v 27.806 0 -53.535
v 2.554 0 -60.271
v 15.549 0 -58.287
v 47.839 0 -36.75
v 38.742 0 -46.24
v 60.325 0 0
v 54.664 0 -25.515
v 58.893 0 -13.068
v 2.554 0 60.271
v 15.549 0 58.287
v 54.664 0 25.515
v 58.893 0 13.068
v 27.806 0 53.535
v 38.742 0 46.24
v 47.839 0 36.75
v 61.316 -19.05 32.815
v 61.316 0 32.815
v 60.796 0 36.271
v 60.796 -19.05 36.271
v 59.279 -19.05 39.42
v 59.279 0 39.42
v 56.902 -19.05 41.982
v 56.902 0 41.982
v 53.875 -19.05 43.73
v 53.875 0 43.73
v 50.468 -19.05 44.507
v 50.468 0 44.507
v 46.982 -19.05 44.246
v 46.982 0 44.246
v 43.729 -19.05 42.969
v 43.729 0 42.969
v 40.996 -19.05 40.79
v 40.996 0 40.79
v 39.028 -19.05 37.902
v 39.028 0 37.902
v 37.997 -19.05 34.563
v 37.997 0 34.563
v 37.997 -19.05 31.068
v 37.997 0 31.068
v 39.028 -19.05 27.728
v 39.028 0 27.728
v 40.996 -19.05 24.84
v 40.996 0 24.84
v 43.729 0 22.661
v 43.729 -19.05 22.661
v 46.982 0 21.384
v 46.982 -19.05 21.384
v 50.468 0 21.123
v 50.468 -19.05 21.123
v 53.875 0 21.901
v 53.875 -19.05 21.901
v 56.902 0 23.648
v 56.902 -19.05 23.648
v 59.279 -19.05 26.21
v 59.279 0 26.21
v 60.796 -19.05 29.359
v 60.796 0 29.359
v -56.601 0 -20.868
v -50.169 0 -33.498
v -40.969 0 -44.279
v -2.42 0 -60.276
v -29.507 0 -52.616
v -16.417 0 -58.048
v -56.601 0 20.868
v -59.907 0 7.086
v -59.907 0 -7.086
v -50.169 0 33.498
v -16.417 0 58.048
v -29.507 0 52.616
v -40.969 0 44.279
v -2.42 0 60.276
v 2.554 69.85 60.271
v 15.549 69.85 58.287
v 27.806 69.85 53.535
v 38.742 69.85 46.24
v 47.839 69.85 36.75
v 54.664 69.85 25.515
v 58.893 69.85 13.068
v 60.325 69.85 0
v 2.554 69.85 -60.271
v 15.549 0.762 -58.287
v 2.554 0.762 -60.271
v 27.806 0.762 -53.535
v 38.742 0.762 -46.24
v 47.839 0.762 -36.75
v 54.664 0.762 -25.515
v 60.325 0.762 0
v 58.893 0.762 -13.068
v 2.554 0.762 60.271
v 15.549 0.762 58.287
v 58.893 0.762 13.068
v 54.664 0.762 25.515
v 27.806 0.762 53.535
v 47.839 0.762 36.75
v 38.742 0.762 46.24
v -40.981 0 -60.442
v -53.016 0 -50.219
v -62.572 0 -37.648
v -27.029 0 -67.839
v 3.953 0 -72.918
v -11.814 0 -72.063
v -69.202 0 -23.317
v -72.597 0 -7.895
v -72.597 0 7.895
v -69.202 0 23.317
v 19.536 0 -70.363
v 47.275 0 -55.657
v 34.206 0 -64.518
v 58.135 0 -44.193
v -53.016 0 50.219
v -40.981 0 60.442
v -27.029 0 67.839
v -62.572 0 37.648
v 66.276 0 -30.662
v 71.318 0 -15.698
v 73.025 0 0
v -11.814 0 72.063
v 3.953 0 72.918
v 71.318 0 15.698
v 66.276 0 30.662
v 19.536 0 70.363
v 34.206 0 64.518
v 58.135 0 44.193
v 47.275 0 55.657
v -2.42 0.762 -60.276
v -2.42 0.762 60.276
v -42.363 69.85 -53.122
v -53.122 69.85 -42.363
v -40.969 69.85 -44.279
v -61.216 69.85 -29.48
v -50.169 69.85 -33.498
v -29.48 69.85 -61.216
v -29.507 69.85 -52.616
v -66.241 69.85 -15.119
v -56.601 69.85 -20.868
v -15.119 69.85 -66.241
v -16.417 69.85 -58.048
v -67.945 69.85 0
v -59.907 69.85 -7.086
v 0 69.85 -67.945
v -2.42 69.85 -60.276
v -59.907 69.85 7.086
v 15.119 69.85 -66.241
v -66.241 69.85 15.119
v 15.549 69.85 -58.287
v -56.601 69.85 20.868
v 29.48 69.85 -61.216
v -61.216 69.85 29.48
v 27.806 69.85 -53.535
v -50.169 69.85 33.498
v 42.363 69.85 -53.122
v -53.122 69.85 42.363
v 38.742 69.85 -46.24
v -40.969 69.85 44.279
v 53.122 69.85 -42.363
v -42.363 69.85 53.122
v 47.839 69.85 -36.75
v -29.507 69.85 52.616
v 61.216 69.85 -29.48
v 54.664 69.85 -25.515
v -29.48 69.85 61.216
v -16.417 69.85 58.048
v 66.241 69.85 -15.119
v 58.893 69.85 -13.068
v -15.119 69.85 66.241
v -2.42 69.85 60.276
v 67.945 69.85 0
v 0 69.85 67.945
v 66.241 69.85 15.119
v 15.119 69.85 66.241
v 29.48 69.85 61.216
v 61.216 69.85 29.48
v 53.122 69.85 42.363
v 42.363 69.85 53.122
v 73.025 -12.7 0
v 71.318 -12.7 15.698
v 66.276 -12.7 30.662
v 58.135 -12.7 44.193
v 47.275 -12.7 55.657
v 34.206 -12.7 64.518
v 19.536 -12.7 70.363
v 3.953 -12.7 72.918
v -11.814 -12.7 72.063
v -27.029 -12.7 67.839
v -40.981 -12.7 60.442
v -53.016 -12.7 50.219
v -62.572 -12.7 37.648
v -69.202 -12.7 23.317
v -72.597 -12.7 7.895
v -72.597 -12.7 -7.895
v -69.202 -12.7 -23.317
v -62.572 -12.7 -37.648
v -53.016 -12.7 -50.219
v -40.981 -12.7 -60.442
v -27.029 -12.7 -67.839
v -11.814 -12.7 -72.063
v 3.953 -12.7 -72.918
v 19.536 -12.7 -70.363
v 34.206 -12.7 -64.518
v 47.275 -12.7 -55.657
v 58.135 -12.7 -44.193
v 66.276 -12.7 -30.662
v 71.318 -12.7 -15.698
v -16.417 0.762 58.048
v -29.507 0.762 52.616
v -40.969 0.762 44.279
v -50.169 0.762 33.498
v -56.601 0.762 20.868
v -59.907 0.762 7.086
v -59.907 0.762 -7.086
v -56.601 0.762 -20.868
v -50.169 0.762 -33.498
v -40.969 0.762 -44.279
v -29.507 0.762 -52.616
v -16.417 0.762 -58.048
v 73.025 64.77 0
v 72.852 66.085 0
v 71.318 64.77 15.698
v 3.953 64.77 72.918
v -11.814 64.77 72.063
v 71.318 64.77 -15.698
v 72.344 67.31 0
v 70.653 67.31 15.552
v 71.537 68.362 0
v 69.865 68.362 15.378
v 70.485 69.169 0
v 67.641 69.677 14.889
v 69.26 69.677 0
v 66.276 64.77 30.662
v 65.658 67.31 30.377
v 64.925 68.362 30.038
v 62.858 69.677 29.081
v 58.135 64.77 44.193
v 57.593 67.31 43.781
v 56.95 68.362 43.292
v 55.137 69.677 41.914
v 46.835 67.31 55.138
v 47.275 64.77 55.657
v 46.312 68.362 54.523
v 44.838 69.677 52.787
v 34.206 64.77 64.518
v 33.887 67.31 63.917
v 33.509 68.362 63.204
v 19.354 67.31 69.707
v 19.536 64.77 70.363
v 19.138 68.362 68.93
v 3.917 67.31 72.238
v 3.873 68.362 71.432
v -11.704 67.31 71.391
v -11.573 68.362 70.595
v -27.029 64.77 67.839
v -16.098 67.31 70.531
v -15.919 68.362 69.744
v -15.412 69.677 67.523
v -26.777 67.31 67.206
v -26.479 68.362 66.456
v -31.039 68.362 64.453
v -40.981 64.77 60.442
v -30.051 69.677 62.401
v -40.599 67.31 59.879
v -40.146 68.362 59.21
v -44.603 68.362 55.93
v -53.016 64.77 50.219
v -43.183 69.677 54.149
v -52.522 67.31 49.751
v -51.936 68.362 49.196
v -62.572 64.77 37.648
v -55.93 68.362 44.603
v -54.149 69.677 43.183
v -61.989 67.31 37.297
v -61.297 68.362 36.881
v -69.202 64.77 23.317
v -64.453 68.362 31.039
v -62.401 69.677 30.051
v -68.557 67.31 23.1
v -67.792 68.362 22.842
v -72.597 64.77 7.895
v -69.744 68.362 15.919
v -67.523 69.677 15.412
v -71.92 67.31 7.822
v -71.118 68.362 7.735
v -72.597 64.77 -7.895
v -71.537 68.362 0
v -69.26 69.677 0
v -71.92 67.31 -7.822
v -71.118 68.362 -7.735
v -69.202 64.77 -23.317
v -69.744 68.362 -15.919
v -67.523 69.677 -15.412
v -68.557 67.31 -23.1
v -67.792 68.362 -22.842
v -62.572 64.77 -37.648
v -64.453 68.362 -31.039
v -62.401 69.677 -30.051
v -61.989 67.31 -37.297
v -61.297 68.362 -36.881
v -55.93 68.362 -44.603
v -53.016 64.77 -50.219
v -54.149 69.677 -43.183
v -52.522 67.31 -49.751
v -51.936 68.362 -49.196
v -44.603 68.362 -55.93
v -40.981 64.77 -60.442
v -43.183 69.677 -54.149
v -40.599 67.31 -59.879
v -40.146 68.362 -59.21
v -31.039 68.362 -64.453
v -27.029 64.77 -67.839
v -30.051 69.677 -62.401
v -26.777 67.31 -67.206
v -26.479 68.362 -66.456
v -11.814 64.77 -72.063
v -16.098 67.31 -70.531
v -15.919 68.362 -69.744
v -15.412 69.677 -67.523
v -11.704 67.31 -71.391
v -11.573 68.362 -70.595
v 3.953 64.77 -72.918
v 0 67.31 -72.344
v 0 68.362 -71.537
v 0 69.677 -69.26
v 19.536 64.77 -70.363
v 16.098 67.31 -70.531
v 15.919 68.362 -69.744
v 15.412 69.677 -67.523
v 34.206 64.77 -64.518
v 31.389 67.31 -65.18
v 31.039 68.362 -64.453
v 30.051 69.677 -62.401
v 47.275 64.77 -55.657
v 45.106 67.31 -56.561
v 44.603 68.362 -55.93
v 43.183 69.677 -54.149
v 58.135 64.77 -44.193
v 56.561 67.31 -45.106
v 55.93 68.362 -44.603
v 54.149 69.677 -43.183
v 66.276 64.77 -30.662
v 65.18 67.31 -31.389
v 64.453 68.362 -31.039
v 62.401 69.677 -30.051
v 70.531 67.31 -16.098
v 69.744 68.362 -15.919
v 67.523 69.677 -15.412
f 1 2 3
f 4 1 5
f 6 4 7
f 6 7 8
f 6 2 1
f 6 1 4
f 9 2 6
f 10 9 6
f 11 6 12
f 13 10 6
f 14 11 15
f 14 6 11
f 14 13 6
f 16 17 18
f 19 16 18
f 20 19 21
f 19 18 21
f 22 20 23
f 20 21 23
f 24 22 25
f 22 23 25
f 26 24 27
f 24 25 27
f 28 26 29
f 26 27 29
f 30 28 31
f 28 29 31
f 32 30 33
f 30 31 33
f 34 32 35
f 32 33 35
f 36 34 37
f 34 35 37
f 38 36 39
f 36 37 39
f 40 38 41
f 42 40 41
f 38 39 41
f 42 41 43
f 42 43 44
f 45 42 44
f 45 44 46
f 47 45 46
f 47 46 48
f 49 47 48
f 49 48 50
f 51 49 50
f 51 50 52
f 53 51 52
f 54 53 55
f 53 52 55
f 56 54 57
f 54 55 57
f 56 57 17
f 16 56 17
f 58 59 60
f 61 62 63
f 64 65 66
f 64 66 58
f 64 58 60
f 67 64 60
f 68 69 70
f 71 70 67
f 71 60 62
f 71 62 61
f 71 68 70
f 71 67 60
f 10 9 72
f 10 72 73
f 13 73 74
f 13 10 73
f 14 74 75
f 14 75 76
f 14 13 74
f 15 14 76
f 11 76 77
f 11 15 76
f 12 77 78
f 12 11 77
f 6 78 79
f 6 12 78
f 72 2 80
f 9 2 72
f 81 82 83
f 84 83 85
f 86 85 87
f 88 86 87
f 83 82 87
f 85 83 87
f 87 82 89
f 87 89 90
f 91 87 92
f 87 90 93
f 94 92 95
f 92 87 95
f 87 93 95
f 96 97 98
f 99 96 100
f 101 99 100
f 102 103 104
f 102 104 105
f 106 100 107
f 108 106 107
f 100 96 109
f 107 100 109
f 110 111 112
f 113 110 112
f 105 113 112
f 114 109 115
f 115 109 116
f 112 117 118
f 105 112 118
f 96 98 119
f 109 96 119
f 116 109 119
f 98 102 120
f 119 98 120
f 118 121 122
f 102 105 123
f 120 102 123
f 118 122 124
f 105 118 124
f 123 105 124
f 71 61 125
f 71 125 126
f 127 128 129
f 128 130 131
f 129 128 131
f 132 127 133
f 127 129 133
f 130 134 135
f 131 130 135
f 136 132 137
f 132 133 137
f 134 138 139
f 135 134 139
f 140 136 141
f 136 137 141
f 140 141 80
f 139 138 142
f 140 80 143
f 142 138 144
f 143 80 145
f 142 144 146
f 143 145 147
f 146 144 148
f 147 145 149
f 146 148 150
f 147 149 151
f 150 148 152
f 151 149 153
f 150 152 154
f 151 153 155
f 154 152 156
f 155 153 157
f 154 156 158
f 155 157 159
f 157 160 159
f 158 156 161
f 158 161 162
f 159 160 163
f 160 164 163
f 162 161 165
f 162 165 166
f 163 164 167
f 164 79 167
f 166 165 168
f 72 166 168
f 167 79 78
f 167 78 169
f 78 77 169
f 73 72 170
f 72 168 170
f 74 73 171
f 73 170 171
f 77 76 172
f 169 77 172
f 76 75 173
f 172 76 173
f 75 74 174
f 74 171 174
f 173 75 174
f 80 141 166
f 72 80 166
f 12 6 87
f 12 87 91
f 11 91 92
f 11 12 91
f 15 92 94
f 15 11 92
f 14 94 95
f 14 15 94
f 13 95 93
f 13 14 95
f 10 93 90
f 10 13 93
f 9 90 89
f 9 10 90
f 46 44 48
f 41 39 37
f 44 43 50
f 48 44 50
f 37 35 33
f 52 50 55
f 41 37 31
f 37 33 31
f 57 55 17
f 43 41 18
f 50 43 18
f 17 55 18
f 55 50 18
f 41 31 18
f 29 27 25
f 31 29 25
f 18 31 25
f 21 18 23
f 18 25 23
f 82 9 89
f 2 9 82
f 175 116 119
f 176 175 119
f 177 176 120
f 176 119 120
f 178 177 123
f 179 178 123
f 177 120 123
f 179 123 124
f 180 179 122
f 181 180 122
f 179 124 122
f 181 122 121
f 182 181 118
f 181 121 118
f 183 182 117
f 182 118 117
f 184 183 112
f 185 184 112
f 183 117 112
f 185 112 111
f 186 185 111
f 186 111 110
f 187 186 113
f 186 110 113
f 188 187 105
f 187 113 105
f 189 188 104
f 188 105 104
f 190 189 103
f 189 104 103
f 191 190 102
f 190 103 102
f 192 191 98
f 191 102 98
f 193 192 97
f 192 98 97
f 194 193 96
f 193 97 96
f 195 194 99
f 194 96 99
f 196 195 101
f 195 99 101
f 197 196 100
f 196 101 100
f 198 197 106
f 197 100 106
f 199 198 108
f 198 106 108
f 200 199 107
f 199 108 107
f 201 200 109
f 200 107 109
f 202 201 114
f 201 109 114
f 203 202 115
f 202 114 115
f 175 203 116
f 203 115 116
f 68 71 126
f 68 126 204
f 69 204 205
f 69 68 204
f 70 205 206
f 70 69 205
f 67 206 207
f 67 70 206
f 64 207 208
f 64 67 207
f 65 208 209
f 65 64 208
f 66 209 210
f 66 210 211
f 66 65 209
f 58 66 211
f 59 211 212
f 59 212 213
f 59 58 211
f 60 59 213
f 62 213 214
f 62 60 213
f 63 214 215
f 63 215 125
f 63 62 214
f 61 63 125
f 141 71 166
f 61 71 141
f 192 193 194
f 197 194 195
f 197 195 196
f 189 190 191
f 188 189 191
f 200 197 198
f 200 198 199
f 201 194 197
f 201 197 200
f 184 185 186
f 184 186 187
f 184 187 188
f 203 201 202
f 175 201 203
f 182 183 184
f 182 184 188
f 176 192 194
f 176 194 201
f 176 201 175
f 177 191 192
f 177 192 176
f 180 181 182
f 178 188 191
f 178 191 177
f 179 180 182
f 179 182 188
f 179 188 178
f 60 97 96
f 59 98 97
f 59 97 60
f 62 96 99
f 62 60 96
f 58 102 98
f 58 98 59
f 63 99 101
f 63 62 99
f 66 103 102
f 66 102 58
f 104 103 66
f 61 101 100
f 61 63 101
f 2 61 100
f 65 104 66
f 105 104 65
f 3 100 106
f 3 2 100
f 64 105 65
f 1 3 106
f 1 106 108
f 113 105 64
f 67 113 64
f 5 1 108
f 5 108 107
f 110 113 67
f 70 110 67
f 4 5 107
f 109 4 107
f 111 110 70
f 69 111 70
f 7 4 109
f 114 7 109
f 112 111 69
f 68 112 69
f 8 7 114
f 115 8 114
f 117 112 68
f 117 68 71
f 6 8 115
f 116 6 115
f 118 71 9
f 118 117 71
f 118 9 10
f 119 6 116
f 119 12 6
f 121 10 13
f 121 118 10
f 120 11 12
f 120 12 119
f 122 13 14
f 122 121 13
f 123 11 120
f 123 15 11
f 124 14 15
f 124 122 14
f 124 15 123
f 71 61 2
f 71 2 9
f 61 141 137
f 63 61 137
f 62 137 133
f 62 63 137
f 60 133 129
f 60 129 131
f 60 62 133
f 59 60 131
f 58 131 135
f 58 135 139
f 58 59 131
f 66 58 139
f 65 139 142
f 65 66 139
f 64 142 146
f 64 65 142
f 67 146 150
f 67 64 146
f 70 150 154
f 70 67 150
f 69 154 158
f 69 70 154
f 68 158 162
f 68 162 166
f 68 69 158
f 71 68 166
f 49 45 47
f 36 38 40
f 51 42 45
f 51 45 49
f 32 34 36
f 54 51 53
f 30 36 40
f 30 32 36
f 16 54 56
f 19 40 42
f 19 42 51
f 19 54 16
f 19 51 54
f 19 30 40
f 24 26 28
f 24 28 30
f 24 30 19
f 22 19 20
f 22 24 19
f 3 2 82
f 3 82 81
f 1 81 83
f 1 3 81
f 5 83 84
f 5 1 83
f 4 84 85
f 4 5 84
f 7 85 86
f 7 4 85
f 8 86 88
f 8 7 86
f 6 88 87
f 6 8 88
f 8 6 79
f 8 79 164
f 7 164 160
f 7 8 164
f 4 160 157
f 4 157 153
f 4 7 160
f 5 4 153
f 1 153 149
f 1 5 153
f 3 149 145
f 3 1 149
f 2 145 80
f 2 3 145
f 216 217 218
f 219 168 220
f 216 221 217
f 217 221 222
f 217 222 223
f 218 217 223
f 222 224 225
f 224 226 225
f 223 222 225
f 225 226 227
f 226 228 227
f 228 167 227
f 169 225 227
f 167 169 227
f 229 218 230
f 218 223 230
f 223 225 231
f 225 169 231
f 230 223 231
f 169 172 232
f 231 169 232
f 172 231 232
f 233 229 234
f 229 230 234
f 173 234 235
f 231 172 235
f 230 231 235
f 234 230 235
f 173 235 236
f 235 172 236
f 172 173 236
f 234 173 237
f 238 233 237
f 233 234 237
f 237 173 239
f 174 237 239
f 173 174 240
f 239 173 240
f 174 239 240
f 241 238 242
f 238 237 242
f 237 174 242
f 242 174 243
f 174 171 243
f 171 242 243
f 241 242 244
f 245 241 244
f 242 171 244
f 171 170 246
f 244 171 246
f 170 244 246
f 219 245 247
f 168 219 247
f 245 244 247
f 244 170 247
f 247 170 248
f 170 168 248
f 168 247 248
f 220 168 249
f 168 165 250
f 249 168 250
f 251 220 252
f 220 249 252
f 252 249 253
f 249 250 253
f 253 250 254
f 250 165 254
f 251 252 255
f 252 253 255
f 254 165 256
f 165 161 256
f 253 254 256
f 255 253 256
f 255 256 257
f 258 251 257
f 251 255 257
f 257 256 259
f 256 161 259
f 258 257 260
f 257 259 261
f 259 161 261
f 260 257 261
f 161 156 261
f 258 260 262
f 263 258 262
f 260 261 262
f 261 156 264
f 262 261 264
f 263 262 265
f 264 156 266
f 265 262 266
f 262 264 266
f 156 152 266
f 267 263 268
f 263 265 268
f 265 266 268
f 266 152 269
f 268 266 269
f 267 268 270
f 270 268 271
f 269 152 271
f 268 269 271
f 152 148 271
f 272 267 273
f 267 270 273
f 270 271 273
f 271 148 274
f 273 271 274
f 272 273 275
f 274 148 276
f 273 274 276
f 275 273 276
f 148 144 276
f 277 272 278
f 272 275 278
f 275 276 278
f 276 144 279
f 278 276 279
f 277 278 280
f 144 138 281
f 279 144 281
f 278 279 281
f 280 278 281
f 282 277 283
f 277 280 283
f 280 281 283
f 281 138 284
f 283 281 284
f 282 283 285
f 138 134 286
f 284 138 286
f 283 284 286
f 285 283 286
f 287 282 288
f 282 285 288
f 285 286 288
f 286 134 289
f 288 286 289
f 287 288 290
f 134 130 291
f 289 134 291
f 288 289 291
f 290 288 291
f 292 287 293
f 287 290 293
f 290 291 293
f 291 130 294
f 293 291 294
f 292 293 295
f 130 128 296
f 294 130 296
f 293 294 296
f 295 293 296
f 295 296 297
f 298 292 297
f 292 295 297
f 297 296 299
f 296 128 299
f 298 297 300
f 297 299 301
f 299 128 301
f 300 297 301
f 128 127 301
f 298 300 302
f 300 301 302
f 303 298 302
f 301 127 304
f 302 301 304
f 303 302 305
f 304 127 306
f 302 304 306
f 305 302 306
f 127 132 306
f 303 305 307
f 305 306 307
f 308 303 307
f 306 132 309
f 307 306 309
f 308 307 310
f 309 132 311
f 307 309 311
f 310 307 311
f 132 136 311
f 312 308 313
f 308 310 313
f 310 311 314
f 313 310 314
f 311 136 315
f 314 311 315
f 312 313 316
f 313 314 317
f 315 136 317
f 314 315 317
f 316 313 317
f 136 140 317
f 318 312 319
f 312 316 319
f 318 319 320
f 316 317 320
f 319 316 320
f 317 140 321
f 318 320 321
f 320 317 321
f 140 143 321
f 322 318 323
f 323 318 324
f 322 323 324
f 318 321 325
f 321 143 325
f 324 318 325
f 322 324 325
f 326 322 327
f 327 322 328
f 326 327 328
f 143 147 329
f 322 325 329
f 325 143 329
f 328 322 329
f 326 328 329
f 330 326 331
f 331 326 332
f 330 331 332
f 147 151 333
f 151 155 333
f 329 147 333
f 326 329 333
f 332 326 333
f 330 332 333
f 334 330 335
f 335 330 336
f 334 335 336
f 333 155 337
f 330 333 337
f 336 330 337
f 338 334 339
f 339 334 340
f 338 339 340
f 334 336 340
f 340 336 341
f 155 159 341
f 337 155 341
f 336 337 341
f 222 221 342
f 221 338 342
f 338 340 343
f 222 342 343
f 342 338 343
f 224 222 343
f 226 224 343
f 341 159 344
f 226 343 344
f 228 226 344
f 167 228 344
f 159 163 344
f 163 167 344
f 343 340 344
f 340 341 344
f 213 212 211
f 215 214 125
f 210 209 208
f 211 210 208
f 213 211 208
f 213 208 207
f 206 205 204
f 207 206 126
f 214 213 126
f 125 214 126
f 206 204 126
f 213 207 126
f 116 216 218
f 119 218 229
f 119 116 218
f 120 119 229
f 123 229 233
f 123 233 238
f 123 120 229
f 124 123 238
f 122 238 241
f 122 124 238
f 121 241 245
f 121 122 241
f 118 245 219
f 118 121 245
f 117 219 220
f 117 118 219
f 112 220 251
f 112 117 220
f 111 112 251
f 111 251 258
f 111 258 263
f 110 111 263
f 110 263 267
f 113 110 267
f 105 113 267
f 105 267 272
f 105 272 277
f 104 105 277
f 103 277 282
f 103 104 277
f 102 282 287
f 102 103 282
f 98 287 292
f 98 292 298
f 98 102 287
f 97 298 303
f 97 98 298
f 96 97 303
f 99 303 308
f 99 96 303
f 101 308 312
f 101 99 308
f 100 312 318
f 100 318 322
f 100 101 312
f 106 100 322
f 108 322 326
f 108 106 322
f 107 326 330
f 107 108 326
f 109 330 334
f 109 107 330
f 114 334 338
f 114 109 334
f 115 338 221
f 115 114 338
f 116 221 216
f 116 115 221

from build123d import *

# Parameters (mm, degrees)
F0_R     = 73.025
F1_DEPTH = 69.85
F2_DEPTH = 0.762
F3_R     = 5.08
F4_DEPTH = 12.7
F5_R     = 11.725025
F6_DEPTH = 19.05


with BuildPart() as f1:
    # F0 (on Front) → F1 (new body)
    with BuildSketch(Plane.XZ):
        Circle(F0_R)
        with BuildLine():
            ThreePointArc((2.553723, 60.270923), (43.549736, 41.743576), (60.325, 0))
            ThreePointArc((60.325, 0), (43.549736, -41.743576), (2.553723, -60.270923))
            ThreePointArc((2.553723, -60.270923), (0.066801, -60.324963), (-2.420234, -60.276431))
            ThreePointArc((-2.420234, -60.276431), (-60.325, 0), (-2.420234, 60.276431))
            ThreePointArc((-2.420234, 60.276431), (0.066801, 60.324963), (2.553723, 60.270923))
        make_face(mode=Mode.SUBTRACT)
        with BuildLine():
            Line((2.553723, -60.270923), (2.553723, 60.270923))
            ThreePointArc((2.553723, 60.270923), (0.066801, 60.324963), (-2.420234, 60.276431))
            Line((-2.420234, 60.276431), (-2.420234, -60.276431))
            ThreePointArc((-2.420234, -60.276431), (0.066801, -60.324963), (2.553723, -60.270923))
        make_face()
    extrude(amount=-F1_DEPTH)

    # F3
    f3_edges = [f1.edges().sort_by_distance(p)[0] for p in [
        (-73.025, 69.85, 0),
    ]]
    fillet(f3_edges, radius=F3_R)


with BuildPart() as f2:
    # F0 (on Front) → F2 (new body)
    with BuildSketch(Plane.XZ):
        with BuildLine():
            ThreePointArc((2.553723, -60.270923), (43.549736, -41.743576), (60.325, 0))
            ThreePointArc((60.325, 0), (43.549736, 41.743576), (2.553723, 60.270923))
            Line((2.553723, 60.270923), (2.553723, -60.270923))
        make_face()
        with BuildLine():
            Line((-2.420234, -60.276431), (-2.420234, 60.276431))
            ThreePointArc((-2.420234, 60.276431), (-60.325, 0), (-2.420234, -60.276431))
        make_face()
    extrude(amount=-F2_DEPTH)


with BuildPart() as f4:
    # F0 (on Front) → F4 (new body)
    with BuildSketch(Plane.XZ):
        Circle(F0_R)
        with BuildLine():
            ThreePointArc((2.553723, 60.270923), (43.549736, 41.743576), (60.325, 0))
            ThreePointArc((60.325, 0), (43.549736, -41.743576), (2.553723, -60.270923))
            ThreePointArc((2.553723, -60.270923), (0.066801, -60.324963), (-2.420234, -60.276431))
            ThreePointArc((-2.420234, -60.276431), (-60.325, 0), (-2.420234, 60.276431))
            ThreePointArc((-2.420234, 60.276431), (0.066801, 60.324963), (2.553723, 60.270923))
        make_face(mode=Mode.SUBTRACT)
        with BuildLine():
            Line((-2.420234, -60.276431), (-2.420234, 60.276431))
            ThreePointArc((-2.420234, 60.276431), (-60.325, 0), (-2.420234, -60.276431))
        make_face()
        with BuildLine():
            Line((2.553723, -60.270923), (2.553723, 60.270923))
            ThreePointArc((2.553723, 60.270923), (0.066801, 60.324963), (-2.420234, 60.276431))
            Line((-2.420234, 60.276431), (-2.420234, -60.276431))
            ThreePointArc((-2.420234, -60.276431), (0.066801, -60.324963), (2.553723, -60.270923))
        make_face()
        with BuildLine():
            ThreePointArc((2.553723, -60.270923), (43.549736, -41.743576), (60.325, 0))
            ThreePointArc((60.325, 0), (43.549736, 41.743576), (2.553723, 60.270923))
            Line((2.553723, 60.270923), (2.553723, -60.270923))
        make_face()
    extrude(amount=F4_DEPTH)


with BuildPart() as f6:
    # F5 (on Front) → F6 (new body)
    with BuildSketch(Plane.XZ):
        with Locations((49.591452, 32.815162)):
            Circle(F5_R)
    extrude(amount=F6_DEPTH)


solid = Compound([f1.part, f2.part, f4.part, f6.part])
